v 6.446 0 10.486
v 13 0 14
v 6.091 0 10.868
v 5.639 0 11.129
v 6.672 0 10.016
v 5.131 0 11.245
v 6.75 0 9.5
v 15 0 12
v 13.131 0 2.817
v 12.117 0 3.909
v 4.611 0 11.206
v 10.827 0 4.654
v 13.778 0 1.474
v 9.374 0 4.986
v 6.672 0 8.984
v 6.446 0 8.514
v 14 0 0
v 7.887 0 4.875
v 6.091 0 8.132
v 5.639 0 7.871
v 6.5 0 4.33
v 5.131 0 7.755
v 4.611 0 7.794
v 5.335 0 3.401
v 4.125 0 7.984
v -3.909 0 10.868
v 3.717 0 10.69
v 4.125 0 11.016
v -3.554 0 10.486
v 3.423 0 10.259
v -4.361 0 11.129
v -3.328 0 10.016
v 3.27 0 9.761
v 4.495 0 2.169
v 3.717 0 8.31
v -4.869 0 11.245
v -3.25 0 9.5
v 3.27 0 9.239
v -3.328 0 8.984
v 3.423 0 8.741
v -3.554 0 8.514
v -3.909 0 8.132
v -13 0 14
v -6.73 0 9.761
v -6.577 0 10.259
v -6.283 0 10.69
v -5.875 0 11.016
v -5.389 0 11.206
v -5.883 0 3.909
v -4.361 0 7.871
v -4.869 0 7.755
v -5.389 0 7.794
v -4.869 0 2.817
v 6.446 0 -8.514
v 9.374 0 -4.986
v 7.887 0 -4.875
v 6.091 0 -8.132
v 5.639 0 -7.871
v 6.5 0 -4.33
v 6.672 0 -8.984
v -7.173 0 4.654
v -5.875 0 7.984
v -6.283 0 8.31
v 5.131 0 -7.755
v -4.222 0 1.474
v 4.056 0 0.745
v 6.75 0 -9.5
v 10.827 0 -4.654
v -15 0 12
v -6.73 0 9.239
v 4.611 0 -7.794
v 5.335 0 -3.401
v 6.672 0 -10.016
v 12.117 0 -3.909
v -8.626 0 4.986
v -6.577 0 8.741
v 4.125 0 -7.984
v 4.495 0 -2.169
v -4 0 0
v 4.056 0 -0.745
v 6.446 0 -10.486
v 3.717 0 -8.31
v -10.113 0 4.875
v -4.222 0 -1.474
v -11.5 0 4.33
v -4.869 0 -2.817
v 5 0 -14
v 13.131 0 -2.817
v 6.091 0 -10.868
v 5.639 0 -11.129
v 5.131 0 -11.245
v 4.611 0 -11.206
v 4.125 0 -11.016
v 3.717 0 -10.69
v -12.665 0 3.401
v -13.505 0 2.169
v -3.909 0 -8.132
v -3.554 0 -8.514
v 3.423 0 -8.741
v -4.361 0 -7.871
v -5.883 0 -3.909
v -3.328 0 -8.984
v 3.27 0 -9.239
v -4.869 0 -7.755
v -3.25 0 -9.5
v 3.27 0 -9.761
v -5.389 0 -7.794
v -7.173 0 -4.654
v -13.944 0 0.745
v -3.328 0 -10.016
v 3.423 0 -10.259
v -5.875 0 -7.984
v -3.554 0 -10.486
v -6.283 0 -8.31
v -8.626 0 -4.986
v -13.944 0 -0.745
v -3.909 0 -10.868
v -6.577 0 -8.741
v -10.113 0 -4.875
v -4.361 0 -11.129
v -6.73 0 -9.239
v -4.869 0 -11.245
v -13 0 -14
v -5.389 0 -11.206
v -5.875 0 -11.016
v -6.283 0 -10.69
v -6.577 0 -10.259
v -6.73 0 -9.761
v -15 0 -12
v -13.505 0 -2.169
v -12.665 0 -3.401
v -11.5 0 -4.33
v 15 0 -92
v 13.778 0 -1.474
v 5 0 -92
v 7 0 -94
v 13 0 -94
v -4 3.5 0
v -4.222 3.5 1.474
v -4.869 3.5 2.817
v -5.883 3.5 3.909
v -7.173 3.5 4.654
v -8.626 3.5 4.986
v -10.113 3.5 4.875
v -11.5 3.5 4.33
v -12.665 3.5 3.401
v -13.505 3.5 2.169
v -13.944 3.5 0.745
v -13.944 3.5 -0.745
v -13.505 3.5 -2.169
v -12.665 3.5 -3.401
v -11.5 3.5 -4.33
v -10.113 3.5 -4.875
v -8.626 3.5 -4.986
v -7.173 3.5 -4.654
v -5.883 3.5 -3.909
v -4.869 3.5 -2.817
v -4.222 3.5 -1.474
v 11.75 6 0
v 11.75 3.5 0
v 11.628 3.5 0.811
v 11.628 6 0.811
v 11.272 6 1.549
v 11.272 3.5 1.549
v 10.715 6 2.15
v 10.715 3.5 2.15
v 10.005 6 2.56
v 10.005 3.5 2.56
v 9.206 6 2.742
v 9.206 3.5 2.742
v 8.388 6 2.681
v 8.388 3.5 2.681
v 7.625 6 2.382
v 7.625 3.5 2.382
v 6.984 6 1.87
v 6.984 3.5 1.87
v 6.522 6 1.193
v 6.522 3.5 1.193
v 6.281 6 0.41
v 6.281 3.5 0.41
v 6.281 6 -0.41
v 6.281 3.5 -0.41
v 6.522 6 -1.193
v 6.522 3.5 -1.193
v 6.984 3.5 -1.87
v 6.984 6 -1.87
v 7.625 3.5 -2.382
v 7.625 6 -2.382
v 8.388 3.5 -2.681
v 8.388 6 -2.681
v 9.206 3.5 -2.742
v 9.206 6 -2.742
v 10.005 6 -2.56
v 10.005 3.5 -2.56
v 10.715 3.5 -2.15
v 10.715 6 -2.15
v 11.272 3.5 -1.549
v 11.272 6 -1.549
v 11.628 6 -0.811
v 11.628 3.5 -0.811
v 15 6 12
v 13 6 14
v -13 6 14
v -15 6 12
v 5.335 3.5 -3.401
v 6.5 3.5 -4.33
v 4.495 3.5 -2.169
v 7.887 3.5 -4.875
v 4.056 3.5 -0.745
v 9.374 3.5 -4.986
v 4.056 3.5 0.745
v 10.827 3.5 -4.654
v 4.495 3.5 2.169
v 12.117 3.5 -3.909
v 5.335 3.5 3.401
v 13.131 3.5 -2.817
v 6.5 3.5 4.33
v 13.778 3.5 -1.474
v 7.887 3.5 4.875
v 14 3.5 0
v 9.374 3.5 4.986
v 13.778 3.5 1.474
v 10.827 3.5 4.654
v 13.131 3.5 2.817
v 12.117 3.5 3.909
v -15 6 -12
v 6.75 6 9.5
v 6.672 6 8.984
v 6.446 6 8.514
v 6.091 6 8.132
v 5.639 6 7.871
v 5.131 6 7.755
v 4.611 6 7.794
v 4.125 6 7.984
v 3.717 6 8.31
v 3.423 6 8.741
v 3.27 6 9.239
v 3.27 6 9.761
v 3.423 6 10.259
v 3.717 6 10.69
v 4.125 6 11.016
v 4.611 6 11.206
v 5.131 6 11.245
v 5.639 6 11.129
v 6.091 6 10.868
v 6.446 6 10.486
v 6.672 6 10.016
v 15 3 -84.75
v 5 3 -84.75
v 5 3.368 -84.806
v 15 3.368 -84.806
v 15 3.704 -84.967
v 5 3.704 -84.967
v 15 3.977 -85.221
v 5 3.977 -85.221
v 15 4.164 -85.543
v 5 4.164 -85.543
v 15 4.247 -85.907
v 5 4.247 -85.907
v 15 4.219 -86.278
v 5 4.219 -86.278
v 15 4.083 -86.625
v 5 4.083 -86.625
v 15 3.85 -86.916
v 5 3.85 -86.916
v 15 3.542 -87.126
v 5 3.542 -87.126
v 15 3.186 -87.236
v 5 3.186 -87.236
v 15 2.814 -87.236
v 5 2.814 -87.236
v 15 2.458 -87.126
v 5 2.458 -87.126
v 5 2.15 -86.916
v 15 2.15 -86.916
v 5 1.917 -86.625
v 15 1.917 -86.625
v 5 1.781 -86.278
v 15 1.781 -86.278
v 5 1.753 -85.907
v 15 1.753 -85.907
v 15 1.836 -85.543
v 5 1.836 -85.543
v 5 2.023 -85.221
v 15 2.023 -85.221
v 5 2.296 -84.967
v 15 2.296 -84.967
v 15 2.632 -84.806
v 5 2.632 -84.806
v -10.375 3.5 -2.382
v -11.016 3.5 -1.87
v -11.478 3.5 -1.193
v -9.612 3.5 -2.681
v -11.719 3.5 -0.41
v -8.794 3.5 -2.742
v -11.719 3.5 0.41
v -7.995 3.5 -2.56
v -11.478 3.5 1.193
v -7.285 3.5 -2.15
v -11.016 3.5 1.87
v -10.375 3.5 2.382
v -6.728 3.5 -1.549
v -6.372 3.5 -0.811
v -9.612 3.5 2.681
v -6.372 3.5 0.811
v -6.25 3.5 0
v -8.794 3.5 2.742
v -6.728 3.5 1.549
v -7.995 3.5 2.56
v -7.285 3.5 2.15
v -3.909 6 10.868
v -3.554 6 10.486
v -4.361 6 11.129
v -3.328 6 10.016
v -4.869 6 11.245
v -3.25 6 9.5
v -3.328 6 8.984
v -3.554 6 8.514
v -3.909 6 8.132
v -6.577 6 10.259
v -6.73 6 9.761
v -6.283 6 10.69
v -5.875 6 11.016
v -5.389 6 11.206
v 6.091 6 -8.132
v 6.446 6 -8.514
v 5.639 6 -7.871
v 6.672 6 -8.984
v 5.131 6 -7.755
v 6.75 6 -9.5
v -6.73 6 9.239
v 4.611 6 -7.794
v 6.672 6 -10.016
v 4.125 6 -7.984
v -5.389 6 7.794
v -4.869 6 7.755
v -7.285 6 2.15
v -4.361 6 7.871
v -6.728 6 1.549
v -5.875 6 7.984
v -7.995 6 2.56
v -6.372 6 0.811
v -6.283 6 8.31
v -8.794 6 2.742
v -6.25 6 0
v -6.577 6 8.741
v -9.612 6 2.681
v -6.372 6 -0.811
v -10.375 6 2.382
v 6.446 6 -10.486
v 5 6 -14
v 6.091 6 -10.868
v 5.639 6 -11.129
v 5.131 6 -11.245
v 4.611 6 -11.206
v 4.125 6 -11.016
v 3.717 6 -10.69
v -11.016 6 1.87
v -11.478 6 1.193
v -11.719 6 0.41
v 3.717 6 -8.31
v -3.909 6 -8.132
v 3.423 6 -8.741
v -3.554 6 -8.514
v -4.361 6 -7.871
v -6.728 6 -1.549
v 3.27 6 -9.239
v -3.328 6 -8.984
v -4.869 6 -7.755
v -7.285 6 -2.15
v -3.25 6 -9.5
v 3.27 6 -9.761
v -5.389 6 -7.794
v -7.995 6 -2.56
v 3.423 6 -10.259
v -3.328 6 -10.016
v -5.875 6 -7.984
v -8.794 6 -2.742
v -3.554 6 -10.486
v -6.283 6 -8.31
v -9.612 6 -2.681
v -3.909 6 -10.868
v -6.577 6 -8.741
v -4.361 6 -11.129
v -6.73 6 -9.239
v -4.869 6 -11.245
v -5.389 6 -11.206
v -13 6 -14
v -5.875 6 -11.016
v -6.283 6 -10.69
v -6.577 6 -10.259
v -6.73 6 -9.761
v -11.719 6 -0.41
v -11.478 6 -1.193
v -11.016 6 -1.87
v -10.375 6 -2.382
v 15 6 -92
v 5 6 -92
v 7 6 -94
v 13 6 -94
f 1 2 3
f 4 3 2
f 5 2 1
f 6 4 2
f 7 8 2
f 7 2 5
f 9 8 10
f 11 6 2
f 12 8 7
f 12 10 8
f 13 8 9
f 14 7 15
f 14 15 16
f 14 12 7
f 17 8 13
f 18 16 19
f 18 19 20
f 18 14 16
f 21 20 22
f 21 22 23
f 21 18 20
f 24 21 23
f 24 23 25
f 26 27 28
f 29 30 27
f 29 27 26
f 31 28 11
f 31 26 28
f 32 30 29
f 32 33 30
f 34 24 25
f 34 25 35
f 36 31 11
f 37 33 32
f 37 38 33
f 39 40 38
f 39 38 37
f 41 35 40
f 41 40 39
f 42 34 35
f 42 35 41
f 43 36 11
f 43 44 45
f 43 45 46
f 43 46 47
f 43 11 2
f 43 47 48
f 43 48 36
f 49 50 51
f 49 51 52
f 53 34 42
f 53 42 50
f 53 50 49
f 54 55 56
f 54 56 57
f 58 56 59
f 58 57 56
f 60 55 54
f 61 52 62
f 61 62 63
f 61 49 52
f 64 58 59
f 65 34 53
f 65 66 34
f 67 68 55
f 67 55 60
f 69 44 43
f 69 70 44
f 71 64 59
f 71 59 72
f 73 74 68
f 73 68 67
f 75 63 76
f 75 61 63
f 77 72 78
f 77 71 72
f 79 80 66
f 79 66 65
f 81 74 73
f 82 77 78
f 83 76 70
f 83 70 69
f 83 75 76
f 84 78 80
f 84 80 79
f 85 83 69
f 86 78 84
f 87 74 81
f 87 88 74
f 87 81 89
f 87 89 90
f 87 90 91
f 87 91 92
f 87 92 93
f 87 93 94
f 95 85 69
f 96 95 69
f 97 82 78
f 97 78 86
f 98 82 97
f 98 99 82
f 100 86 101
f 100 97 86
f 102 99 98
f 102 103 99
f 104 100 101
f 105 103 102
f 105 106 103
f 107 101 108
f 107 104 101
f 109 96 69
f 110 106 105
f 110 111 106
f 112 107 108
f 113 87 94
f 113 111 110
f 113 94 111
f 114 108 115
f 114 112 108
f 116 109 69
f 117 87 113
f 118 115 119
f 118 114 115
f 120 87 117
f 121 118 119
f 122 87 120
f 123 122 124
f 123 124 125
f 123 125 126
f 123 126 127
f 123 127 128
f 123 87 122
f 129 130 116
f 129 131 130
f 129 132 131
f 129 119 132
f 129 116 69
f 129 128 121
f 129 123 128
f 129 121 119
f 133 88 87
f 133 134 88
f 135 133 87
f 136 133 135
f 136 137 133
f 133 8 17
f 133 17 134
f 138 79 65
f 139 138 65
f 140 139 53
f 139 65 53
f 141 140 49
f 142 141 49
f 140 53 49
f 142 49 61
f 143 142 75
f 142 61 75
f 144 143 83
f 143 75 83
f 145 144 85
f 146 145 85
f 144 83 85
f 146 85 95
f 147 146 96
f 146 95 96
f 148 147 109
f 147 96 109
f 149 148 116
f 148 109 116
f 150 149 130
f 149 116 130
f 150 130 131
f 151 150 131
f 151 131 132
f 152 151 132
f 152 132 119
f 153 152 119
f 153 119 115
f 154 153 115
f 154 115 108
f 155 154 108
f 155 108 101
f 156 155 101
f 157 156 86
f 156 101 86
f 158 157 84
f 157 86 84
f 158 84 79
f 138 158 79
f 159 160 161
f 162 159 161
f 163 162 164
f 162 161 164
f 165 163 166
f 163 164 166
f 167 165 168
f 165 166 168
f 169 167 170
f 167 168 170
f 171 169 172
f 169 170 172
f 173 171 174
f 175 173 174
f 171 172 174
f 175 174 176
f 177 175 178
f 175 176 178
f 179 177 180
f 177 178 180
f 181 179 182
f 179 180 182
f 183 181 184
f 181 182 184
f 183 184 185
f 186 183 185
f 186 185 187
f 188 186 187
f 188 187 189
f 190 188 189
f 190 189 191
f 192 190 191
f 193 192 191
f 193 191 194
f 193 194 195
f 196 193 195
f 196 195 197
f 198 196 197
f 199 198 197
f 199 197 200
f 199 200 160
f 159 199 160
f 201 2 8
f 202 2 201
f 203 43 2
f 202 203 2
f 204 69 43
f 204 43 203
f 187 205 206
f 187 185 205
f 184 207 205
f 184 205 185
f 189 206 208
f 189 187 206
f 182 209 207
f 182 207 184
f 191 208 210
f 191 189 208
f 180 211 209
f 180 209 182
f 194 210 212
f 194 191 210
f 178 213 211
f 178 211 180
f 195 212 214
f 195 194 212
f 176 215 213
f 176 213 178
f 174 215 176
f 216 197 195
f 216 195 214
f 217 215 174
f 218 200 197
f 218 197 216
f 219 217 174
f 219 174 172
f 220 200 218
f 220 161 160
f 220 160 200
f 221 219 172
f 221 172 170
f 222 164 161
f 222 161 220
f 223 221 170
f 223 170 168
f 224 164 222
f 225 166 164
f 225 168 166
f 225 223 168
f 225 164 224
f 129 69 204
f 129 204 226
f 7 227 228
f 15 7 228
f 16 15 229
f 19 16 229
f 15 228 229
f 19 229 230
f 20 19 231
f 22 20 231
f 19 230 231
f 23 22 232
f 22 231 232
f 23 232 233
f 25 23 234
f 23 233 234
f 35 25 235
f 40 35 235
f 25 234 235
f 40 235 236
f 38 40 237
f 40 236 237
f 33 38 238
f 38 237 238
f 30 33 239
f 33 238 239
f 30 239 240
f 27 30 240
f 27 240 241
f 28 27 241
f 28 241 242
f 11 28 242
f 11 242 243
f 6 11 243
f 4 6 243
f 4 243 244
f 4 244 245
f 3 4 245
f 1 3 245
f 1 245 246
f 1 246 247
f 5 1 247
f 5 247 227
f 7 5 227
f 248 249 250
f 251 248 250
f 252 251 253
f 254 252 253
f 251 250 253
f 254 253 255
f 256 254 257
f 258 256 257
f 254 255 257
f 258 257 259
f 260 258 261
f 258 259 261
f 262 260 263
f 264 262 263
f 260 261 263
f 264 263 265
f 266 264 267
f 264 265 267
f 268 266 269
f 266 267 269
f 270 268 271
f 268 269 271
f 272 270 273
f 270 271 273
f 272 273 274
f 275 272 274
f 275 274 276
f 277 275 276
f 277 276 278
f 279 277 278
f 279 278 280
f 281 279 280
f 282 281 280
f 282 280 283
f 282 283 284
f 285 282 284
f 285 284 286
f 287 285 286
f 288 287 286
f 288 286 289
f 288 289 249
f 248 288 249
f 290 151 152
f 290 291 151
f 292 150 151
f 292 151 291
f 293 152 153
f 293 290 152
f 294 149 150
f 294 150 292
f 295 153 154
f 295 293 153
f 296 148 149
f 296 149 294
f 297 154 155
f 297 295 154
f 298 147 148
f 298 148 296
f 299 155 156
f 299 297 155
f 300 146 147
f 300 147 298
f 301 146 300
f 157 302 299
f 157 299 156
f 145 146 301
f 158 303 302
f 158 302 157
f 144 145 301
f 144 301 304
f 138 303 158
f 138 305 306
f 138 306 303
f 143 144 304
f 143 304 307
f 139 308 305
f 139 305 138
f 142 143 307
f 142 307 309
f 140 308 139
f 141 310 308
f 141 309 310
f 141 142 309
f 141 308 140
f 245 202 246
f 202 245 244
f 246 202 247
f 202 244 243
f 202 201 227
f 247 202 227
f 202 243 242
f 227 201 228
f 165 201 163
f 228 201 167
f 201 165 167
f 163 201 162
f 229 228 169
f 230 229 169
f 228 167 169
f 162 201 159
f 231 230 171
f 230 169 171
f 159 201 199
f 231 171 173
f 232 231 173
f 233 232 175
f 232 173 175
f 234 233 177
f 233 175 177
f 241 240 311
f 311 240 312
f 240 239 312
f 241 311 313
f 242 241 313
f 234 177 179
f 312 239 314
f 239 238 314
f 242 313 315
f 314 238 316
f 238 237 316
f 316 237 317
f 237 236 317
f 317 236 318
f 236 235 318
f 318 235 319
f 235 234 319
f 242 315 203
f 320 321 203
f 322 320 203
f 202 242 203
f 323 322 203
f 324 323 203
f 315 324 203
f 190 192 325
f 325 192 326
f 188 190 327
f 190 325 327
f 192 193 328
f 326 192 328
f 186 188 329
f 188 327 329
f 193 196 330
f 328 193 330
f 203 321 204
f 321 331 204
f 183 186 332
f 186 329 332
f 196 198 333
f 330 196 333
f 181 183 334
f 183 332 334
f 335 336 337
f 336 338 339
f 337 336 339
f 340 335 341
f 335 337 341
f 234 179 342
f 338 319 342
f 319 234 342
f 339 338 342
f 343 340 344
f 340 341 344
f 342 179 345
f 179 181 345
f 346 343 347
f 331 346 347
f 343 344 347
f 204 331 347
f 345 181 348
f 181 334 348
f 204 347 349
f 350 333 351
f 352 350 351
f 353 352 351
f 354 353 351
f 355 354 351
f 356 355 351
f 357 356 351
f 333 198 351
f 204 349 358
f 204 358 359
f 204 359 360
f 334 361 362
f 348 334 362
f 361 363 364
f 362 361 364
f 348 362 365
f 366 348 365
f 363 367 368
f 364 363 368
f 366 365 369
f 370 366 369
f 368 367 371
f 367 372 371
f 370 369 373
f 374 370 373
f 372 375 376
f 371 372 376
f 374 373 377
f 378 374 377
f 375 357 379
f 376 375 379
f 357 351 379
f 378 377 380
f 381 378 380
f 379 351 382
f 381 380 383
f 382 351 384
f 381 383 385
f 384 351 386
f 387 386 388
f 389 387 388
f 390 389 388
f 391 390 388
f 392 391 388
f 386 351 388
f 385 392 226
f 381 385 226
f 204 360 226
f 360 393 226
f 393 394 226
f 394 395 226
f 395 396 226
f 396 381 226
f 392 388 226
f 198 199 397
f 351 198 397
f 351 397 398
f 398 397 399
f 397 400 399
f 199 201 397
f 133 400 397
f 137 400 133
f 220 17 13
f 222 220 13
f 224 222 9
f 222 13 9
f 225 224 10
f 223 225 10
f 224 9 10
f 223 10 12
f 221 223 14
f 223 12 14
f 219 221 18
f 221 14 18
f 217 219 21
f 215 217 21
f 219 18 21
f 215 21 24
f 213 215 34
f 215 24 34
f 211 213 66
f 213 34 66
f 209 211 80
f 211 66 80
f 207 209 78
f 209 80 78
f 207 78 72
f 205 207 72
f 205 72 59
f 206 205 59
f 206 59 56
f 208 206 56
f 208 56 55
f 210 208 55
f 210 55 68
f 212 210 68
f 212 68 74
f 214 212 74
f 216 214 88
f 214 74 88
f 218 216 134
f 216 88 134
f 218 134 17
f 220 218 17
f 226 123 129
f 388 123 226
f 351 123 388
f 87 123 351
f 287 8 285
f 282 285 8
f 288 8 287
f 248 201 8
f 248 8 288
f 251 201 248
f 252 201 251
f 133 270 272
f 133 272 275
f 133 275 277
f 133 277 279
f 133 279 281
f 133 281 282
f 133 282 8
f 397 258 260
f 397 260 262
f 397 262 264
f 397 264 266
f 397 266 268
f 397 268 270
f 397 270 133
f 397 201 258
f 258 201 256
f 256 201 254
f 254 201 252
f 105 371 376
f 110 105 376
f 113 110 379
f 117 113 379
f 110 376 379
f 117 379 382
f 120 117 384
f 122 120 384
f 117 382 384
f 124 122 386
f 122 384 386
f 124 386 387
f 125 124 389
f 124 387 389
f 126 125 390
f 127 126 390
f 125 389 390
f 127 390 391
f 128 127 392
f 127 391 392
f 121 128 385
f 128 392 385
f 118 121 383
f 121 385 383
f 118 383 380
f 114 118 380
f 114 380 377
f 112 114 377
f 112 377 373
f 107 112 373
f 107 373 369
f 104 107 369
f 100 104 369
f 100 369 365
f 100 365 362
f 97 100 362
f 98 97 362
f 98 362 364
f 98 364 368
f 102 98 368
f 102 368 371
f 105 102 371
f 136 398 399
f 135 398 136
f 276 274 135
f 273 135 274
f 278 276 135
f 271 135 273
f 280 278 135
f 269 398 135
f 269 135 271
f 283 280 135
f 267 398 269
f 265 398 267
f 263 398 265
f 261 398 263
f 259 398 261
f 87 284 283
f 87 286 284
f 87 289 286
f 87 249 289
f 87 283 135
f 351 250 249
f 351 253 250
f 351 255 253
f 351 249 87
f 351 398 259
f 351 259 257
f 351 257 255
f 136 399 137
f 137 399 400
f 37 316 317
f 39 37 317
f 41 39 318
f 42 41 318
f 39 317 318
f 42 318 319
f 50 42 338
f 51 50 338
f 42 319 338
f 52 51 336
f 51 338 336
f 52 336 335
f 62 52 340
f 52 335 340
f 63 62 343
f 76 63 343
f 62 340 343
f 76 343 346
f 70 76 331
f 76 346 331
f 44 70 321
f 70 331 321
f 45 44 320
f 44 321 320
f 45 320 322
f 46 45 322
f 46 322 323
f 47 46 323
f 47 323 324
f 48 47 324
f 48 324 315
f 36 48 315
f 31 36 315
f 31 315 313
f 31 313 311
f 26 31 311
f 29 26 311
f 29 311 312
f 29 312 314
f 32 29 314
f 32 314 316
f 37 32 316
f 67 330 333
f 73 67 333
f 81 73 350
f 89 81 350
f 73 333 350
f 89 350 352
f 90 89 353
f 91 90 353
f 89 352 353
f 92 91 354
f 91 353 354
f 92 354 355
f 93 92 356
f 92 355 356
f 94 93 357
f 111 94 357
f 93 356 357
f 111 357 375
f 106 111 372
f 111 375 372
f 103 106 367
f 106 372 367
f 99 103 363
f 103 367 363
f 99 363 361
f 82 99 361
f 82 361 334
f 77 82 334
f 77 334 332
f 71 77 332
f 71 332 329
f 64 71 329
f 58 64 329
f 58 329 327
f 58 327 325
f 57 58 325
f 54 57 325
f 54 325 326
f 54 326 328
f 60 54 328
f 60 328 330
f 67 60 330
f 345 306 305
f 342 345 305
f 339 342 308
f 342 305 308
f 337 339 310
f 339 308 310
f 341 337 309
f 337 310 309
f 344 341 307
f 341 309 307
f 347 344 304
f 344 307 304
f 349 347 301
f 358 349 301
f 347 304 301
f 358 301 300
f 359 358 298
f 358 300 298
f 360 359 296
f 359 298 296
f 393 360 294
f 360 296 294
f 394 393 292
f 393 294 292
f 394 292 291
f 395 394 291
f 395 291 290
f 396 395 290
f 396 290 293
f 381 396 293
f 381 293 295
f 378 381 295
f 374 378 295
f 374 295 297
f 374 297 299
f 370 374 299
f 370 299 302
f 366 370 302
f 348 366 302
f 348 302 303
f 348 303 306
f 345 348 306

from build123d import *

# Parameters (mm, degrees)
SKETCH_1_W               = 30
SKETCH_1_H               = 28
EXTRUDE_1_DEPTH          = 6
SKETCH_2_R               = 1.75
CUT_EXTRUDE_1_DEPTH      = 7
SKETCH_4_R               = 2.75
CUT_EXTRUDE_4_DEPTH      = 3.5
CUT_EXTRUDE_4_DEPTH_BACK = 7
EXTRUDE_2_DEPTH          = 6
SKETCH_6_R               = 5
CUT_EXTRUDE_5_DEPTH      = 3.5
CHAMFER_1_SIZE           = 2
CUT_EXTRUDE_6_REACH      = 12
SKETCH_8_R               = 1.25


with BuildPart() as part:
    # 草图1 → 凸台-拉伸1 (new body)
    with BuildSketch(Plane(origin=(0, 0, 0), x_dir=(1, 0, 0), z_dir=(0, 1, 0))):
        Rectangle(SKETCH_1_W, SKETCH_1_H)
    extrude(amount=EXTRUDE_1_DEPTH)

    # 草图2 → 切除-拉伸1 (cut, through all)
    with BuildSketch(Plane(origin=(0, 6, 0), x_dir=(1, 0, 0), z_dir=(0, 1, 0))):
        with Locations((-5, 9.5)):
            Circle(SKETCH_2_R)
        with Locations((5, 9.5)):
            Circle(SKETCH_2_R)
        with Locations((-5, -9.5)):
            Circle(SKETCH_2_R)
        with Locations((5, -9.5)):
            Circle(SKETCH_2_R)
    extrude(amount=-CUT_EXTRUDE_1_DEPTH, mode=Mode.SUBTRACT)

    # 草图4 → 切除-拉伸4 (cut, two sides)
    with BuildSketch(Plane.XZ) as cut_extrude_4_sk:
        with Locations((-9, 0)):
            Circle(SKETCH_4_R)
        with Locations((9, 0)):
            Circle(SKETCH_4_R)
    extrude(amount=CUT_EXTRUDE_4_DEPTH, mode=Mode.SUBTRACT)
    extrude(cut_extrude_4_sk.sketch, amount=-CUT_EXTRUDE_4_DEPTH_BACK, mode=Mode.SUBTRACT)

    # 草图7 → 凸台-拉伸2 (add)
    with BuildSketch(Plane(origin=(0, 6, 0), x_dir=(1, 0, 0), z_dir=(0, 1, 0))):
        Polygon((15, 74), (15, 14), (5, 14), (5, 64), (5, 94), (15, 94), align=None)
    extrude(amount=-EXTRUDE_2_DEPTH)

    # 草图6 → 切除-拉伸5 (cut)
    with BuildSketch(Plane.XZ):
        with Locations((-9, 0)):
            Circle(SKETCH_6_R)
        with Locations((9, 0)):
            Circle(SKETCH_6_R)
    extrude(amount=-CUT_EXTRUDE_5_DEPTH, mode=Mode.SUBTRACT)

    # 倒角1
    chamfer_1_edges = [part.edges().sort_by_distance(p)[0] for p in [
        (5, 3, -94),
        (15, 3, -94),
        (15, 3, 14),
        (-15, 3, 14),
        (-15, 3, -14),
    ]]
    chamfer(chamfer_1_edges, length=CHAMFER_1_SIZE)

    # 草图8 → 切除-拉伸6 (cut, up to next)
    with BuildSketch(Plane.ZY.offset(-5), mode=Mode.PRIVATE) as cut_extrude_6_sk1:
        with Locations((-86, 3)):
            Circle(SKETCH_8_R)
    cut_extrude_6_tool1 = extrude(cut_extrude_6_sk1.sketch, amount=-CUT_EXTRUDE_6_REACH, mode=Mode.PRIVATE) & part.part
    add(cut_extrude_6_tool1.solids().sort_by_distance((5, 3, -86))[0], mode=Mode.SUBTRACT)


solid = part.part
